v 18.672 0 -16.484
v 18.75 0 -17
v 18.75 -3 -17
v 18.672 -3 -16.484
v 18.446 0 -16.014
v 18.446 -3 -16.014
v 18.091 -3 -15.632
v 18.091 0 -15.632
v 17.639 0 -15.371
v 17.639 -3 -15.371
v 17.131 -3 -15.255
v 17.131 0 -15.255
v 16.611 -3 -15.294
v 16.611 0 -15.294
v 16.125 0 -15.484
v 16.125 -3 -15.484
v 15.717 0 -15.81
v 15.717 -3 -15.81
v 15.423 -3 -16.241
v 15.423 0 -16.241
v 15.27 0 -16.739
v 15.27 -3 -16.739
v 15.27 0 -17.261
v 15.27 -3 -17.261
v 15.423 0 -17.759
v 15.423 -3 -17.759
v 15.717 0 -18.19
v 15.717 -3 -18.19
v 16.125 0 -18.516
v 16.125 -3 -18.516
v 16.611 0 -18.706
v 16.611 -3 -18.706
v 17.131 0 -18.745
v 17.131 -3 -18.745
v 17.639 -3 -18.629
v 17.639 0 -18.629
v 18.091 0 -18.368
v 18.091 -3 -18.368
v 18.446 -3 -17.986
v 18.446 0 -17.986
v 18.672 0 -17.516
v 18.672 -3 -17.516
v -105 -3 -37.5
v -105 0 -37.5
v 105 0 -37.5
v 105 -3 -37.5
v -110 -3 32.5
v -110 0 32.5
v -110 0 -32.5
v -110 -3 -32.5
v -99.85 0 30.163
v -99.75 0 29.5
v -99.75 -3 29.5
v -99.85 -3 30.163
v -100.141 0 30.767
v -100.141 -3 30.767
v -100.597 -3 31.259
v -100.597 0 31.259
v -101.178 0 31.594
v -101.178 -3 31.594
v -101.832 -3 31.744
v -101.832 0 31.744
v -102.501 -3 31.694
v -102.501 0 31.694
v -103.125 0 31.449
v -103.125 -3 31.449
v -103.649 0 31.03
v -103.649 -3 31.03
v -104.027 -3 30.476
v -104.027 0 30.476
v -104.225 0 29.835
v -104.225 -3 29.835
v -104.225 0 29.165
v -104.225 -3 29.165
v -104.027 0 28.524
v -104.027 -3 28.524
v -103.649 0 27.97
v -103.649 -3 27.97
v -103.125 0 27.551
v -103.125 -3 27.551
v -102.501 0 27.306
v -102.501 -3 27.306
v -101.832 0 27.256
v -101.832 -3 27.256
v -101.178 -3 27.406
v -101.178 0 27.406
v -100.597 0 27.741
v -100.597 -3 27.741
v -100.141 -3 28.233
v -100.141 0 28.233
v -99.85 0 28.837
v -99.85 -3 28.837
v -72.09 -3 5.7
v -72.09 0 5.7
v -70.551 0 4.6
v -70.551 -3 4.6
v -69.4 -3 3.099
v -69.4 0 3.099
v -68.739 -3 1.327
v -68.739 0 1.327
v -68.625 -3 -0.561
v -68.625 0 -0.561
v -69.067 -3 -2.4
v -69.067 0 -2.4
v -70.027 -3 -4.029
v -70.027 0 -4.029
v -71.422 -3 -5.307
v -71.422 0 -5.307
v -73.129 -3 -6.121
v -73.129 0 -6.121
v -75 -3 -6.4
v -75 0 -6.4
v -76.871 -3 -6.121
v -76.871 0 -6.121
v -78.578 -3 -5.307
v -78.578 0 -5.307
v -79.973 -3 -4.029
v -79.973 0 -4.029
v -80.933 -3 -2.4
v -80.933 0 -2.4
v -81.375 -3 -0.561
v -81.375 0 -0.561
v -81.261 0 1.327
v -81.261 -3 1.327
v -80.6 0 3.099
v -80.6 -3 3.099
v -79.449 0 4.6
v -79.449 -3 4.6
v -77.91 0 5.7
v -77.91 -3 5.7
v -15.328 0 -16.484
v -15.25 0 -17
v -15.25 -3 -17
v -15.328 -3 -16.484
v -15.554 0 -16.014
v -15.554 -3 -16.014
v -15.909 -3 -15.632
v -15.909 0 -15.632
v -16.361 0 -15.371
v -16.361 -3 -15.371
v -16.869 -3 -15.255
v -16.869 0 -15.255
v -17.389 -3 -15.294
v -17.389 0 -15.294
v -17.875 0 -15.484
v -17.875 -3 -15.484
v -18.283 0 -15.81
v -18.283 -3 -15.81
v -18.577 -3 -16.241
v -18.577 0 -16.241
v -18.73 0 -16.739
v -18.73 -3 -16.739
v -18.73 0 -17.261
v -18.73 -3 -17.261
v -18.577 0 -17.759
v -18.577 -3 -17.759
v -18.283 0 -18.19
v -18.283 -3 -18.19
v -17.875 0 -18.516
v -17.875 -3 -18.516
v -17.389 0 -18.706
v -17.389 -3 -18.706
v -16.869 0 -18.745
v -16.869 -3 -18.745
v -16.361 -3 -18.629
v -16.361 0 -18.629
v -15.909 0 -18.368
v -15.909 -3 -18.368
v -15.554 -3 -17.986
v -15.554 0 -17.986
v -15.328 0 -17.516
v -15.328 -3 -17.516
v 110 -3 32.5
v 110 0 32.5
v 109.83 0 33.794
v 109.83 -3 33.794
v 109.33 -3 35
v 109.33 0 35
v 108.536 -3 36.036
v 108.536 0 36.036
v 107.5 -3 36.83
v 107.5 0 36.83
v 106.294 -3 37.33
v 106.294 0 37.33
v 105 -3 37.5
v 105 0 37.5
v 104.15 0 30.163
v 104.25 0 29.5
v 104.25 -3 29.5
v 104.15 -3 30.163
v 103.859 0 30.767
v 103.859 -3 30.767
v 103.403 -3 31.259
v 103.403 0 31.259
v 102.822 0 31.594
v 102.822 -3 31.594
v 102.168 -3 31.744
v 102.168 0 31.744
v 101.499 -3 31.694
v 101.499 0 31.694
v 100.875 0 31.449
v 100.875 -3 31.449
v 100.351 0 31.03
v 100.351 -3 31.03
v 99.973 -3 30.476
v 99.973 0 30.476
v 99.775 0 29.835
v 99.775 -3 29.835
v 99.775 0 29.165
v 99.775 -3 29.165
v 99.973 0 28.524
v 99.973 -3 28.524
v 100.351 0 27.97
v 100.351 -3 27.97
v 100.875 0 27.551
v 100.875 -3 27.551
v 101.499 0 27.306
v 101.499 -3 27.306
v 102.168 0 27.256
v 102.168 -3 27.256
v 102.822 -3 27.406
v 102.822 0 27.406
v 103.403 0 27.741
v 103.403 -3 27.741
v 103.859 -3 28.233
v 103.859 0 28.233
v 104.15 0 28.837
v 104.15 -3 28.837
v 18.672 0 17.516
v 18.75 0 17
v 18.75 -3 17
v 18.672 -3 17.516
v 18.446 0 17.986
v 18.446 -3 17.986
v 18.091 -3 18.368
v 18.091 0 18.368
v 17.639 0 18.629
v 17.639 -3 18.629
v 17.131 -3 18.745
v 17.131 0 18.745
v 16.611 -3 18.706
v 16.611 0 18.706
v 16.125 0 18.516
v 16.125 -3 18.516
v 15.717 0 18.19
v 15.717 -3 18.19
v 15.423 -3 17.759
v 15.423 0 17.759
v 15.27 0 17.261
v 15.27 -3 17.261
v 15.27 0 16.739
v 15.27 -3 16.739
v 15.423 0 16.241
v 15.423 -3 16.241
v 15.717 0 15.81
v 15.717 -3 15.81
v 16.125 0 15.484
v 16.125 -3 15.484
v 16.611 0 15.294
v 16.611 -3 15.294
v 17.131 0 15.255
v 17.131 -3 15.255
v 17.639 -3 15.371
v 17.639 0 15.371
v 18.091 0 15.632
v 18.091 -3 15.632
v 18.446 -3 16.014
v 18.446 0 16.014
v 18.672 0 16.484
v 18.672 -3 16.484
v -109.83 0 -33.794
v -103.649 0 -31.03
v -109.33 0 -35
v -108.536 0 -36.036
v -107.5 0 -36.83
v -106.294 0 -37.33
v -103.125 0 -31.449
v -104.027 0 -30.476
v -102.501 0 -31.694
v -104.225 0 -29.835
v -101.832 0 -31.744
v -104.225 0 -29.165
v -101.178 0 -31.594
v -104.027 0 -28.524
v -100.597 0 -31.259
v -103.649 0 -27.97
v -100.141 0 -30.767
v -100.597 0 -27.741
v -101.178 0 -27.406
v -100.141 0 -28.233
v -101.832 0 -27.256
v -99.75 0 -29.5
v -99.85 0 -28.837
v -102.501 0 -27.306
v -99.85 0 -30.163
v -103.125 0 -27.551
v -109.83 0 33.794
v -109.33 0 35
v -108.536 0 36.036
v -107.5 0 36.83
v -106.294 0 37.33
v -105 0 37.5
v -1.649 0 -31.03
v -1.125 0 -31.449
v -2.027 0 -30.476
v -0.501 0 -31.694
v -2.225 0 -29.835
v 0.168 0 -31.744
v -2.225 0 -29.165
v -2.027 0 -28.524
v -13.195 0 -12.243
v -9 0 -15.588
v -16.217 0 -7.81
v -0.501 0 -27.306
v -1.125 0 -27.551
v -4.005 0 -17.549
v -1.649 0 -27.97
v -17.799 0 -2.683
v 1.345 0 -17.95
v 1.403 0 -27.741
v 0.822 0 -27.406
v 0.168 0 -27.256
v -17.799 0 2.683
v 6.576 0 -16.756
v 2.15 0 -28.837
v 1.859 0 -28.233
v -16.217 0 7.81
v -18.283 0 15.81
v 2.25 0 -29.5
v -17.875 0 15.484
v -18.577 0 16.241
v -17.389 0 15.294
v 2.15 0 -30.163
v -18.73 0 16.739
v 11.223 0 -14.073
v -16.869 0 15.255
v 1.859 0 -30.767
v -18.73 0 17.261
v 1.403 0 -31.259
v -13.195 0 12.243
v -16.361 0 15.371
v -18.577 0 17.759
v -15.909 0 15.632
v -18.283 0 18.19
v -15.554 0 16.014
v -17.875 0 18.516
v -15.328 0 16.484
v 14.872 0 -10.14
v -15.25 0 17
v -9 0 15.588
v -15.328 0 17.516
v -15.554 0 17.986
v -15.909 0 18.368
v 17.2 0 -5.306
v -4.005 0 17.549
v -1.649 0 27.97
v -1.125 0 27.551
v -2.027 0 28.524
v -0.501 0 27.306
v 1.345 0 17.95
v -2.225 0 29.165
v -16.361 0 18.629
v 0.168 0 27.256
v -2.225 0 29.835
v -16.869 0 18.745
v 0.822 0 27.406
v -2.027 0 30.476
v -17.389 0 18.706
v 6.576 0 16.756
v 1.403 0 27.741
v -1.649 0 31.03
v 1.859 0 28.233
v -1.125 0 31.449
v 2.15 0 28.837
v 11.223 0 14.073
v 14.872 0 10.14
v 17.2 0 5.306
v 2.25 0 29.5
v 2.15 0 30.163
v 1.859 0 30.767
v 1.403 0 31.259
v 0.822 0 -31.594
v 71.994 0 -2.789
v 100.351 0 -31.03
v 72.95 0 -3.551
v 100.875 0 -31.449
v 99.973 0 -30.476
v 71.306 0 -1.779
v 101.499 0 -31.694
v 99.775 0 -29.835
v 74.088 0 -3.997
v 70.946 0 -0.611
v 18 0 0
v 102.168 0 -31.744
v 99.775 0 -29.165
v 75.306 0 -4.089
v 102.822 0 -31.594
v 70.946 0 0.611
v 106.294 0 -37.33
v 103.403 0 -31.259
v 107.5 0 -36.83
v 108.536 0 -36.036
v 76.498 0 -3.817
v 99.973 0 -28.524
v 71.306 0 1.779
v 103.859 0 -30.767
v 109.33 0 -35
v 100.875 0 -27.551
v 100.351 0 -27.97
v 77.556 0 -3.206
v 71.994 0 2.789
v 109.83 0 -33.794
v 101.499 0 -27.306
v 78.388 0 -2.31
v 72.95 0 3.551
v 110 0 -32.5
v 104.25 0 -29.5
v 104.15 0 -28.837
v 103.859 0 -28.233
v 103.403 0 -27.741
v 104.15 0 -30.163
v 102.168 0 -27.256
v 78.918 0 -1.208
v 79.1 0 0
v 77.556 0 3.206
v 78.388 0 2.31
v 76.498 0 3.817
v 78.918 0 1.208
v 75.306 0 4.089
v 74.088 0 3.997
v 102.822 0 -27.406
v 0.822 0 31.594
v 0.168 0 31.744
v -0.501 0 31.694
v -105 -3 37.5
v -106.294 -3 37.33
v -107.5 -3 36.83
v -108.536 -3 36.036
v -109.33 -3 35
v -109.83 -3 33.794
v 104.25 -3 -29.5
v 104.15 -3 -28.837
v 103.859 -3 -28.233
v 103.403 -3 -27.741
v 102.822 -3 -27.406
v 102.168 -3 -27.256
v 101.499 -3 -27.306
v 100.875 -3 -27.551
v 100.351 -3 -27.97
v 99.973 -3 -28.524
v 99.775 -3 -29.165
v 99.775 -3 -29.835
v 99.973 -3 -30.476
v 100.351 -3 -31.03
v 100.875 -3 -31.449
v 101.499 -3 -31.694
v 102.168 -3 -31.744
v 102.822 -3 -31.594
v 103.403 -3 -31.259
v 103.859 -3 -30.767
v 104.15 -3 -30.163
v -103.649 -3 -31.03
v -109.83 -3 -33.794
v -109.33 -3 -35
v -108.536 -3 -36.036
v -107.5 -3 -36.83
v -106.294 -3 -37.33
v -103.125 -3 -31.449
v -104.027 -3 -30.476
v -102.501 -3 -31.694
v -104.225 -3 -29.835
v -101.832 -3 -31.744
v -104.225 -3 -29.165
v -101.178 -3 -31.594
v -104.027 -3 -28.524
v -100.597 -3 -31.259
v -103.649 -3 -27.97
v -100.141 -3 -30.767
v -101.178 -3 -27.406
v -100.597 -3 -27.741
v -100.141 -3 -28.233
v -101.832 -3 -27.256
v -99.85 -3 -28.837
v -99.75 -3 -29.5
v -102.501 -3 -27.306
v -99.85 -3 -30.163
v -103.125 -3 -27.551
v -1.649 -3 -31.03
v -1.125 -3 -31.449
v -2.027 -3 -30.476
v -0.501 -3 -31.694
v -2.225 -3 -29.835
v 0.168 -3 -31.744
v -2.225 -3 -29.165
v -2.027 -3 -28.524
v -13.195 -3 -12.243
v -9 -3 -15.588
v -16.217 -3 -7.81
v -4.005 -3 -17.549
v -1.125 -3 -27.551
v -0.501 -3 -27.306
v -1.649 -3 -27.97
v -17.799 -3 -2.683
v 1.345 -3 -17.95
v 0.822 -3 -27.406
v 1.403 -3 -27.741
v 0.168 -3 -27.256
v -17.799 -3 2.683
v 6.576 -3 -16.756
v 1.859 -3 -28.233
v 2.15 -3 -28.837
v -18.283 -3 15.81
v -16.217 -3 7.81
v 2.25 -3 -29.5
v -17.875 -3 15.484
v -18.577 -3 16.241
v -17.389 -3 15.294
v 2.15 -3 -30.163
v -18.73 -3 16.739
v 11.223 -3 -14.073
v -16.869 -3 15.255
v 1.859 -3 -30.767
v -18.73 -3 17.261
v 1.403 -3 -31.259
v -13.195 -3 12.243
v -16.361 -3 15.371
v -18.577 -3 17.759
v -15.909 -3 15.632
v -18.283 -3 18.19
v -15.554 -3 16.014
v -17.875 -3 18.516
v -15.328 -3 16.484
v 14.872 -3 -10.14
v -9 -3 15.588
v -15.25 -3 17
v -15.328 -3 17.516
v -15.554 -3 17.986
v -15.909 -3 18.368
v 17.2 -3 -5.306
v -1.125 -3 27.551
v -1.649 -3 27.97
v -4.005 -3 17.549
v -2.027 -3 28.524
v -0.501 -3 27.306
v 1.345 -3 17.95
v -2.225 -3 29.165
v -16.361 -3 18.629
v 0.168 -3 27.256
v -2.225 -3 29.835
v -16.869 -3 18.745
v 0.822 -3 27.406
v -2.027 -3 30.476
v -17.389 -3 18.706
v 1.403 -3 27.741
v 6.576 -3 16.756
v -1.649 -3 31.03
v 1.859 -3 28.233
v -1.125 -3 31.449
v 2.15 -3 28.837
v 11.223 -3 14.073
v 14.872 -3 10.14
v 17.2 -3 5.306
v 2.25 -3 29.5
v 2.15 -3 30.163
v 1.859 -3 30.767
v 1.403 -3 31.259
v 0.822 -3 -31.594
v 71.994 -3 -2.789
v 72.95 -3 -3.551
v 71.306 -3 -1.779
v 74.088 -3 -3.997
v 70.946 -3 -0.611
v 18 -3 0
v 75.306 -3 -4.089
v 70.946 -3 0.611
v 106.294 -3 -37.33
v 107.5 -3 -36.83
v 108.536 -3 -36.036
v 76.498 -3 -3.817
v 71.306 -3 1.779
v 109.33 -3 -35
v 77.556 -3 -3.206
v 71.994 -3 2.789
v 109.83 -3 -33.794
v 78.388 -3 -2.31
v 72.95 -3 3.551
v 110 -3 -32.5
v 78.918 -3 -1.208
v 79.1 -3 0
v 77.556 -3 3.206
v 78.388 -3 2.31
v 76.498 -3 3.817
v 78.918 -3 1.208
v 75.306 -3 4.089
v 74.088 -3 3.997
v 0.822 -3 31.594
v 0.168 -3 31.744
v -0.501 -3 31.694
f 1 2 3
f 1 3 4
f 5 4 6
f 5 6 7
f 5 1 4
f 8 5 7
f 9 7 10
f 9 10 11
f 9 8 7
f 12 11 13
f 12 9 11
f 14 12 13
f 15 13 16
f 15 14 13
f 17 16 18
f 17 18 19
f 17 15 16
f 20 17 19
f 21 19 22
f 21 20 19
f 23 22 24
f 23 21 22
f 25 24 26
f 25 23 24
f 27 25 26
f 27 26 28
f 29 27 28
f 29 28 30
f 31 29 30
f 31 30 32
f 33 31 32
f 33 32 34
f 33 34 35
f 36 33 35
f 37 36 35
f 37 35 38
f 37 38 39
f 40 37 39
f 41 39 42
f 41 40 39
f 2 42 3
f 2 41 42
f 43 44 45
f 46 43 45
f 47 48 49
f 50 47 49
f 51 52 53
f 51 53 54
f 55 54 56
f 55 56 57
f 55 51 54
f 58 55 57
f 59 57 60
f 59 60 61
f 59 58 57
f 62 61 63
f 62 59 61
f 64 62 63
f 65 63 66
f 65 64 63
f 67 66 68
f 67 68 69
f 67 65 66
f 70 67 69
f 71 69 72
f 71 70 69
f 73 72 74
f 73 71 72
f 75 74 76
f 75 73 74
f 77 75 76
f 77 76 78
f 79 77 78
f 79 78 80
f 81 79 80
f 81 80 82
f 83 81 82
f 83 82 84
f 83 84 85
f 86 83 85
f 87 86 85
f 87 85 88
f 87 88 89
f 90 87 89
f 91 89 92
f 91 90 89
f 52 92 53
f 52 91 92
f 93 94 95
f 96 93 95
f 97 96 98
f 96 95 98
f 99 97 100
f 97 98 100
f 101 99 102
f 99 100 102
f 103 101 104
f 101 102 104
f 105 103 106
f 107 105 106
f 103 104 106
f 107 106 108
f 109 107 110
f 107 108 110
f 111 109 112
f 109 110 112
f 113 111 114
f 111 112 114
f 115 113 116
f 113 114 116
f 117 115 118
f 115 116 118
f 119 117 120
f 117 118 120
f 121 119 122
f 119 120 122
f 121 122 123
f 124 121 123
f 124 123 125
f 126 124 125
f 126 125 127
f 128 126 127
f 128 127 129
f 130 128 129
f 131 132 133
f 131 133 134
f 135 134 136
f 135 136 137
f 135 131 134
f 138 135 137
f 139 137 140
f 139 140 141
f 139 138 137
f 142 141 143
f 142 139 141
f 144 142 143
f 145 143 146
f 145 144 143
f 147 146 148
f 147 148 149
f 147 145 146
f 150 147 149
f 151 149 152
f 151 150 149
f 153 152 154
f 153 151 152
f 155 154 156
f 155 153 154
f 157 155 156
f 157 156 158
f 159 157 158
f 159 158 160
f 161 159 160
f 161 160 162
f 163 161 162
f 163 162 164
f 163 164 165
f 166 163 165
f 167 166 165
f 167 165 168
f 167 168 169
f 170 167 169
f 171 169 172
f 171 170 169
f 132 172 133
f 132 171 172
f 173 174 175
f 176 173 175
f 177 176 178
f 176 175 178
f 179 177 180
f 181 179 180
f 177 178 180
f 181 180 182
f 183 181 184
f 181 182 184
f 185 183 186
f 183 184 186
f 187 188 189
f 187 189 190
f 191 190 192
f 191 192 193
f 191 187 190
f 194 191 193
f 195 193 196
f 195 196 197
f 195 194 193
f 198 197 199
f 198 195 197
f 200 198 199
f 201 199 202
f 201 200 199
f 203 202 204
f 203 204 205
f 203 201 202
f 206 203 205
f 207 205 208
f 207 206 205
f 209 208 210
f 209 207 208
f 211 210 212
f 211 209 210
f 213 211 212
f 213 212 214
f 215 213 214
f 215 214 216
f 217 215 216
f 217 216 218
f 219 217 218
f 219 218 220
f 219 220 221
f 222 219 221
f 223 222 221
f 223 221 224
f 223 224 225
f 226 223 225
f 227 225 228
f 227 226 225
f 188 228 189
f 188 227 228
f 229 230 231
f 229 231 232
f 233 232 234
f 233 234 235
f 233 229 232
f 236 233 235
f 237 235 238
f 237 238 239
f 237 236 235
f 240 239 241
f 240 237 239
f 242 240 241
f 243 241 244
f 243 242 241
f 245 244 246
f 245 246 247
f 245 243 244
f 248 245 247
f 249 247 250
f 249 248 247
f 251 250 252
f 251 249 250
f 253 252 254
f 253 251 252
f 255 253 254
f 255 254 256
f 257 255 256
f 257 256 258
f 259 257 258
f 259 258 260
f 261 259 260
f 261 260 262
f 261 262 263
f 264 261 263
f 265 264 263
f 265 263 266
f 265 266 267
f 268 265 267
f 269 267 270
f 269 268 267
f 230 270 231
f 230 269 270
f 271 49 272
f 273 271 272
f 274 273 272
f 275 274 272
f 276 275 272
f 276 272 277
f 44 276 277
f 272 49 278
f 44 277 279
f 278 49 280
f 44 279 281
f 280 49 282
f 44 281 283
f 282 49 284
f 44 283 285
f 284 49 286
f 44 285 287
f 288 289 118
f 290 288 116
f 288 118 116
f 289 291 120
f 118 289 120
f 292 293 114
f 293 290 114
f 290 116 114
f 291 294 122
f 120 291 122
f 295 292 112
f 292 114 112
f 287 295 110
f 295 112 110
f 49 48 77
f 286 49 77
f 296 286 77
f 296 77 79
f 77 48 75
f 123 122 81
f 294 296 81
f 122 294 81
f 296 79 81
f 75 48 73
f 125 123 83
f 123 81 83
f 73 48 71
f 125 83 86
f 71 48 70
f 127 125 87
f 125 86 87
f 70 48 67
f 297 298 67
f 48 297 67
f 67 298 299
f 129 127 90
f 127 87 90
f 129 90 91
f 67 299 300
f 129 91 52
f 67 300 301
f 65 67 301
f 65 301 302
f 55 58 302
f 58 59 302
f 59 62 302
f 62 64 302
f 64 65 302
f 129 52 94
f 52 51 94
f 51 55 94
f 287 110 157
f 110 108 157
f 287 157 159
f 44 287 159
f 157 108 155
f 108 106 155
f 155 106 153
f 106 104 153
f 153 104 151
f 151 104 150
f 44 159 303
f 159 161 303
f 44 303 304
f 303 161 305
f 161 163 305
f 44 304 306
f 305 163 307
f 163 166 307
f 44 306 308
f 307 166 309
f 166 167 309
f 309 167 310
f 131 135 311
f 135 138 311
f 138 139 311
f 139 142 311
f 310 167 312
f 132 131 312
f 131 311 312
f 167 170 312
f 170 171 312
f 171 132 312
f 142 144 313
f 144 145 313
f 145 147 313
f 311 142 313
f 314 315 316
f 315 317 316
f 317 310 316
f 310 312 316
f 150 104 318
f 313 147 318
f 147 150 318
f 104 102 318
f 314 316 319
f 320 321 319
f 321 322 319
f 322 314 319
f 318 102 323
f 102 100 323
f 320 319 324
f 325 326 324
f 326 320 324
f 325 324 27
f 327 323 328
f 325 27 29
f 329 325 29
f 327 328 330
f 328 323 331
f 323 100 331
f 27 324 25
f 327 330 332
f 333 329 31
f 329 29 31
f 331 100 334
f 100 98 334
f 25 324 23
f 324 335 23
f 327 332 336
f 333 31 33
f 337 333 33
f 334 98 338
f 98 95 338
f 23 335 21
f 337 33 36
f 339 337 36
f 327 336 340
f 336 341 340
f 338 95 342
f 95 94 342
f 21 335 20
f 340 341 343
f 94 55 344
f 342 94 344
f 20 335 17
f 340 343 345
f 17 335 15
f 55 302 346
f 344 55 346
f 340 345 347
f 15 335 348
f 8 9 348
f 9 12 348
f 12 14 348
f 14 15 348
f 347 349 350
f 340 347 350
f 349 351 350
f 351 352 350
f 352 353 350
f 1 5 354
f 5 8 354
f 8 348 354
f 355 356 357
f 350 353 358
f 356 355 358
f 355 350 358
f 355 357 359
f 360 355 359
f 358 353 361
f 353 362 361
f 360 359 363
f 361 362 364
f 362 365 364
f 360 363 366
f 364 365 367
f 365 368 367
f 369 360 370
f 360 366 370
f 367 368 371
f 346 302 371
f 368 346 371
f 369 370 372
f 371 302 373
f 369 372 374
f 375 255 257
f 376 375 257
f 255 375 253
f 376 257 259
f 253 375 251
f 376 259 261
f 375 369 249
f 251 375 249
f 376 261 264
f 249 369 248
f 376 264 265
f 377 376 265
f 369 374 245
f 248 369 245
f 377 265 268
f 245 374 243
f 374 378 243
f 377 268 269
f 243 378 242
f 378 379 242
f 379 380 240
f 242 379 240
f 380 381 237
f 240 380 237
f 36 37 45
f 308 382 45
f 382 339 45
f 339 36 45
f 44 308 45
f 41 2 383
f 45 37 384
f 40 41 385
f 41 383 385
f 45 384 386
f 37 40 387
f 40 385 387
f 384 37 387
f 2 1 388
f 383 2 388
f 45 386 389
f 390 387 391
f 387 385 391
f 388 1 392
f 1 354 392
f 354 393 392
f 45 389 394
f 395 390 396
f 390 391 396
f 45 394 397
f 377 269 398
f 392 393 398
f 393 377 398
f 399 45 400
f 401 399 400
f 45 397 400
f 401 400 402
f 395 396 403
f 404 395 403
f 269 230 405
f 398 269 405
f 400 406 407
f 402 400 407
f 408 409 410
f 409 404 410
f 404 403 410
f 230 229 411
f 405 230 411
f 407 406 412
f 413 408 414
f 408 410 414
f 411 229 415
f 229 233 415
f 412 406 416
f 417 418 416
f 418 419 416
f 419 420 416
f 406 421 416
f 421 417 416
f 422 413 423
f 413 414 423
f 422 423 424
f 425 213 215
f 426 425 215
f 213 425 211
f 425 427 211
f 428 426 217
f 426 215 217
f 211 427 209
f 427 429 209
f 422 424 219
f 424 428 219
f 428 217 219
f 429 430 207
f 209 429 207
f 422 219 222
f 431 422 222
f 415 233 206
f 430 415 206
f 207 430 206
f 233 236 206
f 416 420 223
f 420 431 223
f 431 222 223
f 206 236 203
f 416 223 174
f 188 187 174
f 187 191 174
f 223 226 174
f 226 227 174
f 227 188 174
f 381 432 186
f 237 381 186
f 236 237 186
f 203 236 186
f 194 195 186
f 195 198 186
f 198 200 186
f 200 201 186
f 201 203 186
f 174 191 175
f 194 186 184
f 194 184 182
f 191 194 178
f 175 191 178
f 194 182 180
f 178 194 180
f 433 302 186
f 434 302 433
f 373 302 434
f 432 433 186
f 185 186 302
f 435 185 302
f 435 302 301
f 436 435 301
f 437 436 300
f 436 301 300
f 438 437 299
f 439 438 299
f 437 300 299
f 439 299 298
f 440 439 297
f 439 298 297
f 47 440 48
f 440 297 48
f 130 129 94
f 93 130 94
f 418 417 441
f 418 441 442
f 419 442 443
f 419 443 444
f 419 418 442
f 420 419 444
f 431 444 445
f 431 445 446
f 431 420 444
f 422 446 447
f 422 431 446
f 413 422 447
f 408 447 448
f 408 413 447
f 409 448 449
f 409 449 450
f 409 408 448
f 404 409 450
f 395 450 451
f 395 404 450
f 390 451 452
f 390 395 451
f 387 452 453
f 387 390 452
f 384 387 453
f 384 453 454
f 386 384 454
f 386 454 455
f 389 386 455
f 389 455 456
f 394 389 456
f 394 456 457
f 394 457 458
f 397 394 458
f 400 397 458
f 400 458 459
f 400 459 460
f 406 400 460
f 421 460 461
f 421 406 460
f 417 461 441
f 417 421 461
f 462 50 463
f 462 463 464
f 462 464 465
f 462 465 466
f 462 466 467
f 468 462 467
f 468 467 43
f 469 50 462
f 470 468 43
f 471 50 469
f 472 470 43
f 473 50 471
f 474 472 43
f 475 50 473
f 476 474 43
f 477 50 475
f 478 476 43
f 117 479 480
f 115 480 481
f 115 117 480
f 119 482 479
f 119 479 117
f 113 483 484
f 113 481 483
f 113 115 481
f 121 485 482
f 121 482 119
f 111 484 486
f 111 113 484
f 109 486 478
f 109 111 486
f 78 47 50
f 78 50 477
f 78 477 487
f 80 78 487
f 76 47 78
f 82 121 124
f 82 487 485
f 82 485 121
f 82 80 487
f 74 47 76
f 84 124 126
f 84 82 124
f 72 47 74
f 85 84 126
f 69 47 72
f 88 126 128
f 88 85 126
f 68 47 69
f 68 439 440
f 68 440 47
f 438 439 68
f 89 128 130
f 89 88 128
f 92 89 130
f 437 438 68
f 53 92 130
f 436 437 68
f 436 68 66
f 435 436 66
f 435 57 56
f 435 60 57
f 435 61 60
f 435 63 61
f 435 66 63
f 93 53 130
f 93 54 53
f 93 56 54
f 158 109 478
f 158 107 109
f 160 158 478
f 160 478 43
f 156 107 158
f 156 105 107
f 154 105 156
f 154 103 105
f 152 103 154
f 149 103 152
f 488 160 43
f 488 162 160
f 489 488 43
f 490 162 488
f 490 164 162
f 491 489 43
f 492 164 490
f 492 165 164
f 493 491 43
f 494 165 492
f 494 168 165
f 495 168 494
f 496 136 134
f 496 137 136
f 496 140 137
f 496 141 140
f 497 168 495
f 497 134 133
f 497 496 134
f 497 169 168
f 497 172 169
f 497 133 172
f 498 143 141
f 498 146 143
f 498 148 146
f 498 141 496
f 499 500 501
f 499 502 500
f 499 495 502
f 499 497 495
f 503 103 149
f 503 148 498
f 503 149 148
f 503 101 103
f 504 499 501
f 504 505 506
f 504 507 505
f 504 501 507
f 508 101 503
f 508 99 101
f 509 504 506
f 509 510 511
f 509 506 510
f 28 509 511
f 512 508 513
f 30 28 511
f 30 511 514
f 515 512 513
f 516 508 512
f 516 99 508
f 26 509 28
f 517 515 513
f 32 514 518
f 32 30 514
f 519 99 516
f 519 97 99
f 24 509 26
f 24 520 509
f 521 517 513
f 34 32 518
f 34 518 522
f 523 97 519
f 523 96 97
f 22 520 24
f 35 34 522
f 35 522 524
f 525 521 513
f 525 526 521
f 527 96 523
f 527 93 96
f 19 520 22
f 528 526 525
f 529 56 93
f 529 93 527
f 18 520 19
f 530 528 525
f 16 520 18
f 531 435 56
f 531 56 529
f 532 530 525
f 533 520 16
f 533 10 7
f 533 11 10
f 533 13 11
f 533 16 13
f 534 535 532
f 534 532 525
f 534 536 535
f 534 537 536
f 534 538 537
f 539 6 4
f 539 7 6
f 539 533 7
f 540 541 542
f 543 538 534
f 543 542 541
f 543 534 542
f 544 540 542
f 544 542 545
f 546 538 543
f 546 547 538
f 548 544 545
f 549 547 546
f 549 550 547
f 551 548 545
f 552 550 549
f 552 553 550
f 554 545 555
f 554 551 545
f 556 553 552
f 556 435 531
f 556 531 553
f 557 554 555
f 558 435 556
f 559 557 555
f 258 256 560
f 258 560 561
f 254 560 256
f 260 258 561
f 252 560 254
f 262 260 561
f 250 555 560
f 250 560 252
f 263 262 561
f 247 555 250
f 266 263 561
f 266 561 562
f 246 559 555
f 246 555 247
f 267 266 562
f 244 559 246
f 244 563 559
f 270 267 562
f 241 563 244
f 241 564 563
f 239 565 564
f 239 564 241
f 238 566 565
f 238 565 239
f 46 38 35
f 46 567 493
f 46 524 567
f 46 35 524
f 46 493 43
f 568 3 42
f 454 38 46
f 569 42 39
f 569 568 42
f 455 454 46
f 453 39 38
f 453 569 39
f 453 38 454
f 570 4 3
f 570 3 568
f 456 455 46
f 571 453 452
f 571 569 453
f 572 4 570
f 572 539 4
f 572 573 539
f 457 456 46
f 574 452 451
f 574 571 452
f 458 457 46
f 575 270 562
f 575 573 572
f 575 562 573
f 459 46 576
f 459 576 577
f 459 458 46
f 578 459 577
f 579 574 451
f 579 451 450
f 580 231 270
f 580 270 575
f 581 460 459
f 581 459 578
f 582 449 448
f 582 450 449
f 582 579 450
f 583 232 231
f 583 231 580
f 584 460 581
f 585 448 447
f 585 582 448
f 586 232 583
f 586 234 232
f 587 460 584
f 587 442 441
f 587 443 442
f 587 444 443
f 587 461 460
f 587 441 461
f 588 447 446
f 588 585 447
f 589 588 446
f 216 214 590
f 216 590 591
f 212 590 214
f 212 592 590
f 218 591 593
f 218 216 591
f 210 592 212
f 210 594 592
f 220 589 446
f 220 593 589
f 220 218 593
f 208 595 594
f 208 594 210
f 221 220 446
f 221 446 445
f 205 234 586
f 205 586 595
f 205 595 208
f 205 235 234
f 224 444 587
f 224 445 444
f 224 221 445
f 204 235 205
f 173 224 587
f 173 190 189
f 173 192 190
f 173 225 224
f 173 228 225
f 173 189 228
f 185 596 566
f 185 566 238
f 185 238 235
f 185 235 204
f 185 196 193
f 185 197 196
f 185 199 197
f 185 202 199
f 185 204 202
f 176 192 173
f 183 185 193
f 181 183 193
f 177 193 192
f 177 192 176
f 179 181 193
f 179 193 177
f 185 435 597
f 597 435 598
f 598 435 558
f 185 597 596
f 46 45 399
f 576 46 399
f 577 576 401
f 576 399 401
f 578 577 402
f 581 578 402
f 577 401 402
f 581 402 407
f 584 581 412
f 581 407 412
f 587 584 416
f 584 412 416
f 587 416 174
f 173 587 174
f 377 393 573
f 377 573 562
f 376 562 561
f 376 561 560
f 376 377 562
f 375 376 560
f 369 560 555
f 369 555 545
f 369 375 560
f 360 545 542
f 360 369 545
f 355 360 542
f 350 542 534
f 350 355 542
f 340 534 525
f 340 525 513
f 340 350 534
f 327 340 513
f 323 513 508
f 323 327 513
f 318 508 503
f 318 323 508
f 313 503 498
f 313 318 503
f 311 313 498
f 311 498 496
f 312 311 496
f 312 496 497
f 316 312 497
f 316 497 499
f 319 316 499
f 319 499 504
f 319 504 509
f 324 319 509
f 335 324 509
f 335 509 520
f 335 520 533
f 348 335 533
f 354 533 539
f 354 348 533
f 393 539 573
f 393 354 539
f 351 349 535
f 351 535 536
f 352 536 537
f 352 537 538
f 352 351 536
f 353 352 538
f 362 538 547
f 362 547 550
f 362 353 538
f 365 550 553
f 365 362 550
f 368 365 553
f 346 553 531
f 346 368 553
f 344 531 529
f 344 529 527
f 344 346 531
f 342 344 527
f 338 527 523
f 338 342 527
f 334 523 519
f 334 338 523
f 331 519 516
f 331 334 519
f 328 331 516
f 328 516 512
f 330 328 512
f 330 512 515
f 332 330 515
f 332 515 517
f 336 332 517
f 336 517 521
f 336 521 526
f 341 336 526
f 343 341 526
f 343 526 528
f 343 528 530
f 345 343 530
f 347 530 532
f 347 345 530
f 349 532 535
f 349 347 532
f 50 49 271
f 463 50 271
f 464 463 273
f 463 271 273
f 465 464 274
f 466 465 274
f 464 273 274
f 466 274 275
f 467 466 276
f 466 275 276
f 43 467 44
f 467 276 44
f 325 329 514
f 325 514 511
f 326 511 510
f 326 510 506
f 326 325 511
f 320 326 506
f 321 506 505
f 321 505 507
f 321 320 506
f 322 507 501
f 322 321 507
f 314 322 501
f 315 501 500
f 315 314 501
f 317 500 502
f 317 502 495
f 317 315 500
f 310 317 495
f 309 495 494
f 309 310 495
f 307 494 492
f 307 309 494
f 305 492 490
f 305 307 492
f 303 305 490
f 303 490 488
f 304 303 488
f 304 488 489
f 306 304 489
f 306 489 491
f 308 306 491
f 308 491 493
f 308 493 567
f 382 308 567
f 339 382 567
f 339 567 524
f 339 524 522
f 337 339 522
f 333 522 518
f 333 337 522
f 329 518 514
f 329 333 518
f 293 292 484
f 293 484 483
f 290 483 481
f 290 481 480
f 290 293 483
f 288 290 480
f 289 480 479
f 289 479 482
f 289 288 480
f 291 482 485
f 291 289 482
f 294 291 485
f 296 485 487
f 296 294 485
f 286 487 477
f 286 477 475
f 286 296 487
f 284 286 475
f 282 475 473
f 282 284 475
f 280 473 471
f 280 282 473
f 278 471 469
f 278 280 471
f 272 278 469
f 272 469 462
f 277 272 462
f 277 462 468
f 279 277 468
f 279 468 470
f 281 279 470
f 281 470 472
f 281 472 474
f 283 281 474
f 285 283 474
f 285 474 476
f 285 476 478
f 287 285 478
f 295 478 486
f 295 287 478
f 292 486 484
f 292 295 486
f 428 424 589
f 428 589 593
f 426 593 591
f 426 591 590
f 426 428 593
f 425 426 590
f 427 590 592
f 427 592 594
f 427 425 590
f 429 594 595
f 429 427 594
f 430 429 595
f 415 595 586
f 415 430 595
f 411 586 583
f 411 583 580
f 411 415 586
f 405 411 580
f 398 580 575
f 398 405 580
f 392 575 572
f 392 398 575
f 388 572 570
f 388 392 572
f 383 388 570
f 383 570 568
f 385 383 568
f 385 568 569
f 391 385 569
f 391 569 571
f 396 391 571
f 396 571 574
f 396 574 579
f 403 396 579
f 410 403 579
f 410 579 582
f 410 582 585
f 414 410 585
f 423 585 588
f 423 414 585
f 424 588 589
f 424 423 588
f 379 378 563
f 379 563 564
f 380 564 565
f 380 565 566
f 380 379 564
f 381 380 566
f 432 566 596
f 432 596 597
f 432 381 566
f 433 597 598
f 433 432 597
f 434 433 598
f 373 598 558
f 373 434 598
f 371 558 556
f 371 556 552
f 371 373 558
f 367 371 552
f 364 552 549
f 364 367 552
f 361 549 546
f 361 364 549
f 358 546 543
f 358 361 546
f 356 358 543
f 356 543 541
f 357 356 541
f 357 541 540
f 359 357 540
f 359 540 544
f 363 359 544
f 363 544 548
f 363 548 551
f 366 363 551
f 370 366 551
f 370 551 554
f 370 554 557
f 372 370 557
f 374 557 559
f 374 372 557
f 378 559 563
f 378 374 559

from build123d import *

# Parameters (mm, degrees)
F0_R     = 2.25
F0_R_2   = 1.75
F0_R_3   = 18
F0_R_4   = 4.1
F1_DEPTH = 3


with BuildPart() as f1:
    # F0 (on Front) → F1 (new body)
    with BuildSketch(Plane.XZ):
        with BuildLine():
            ThreePointArc((110, 32.5), (108.535534, 36.035534), (105, 37.5))
            Line((105, 37.5), (-105, 37.5))
            ThreePointArc((-105, 37.5), (-108.535534, 36.035534), (-110, 32.5))
            Line((-110, 32.5), (-110, -32.5))
            ThreePointArc((-110, -32.5), (-108.535534, -36.035534), (-105, -37.5))
            Line((-105, -37.5), (105, -37.5))
            ThreePointArc((105, -37.5), (108.535534, -36.035534), (110, -32.5))
            Line((110, -32.5), (110, 32.5))
        make_face()
        with Locations((-102, -29.5)):
            Circle(F0_R, mode=Mode.SUBTRACT)
        with BuildLine():
            ThreePointArc((-72.089674, 5.7), (-75, -6.4), (-77.910326, 5.7))
            Line((-77.910326, 5.7), (-72.089674, 5.7))
        make_face(mode=Mode.SUBTRACT)
        with Locations((-17, -17)):
            Circle(F0_R_2, mode=Mode.SUBTRACT)
        with Locations((0, -29.5)):
            Circle(F0_R, mode=Mode.SUBTRACT)
        with Locations((102, -29.5)):
            Circle(F0_R, mode=Mode.SUBTRACT)
        with Locations((17, -17)):
            Circle(F0_R_2, mode=Mode.SUBTRACT)
        with Locations((-17, 17)):
            Circle(F0_R_2, mode=Mode.SUBTRACT)
        with Locations((-102, 29.5)):
            Circle(F0_R, mode=Mode.SUBTRACT)
        Circle(F0_R_3, mode=Mode.SUBTRACT)
        with Locations((17, 17)):
            Circle(F0_R_2, mode=Mode.SUBTRACT)
        with Locations((75, 0)):
            Circle(F0_R_4, mode=Mode.SUBTRACT)
        with Locations((0, 29.5)):
            Circle(F0_R, mode=Mode.SUBTRACT)
        with Locations((102, 29.5)):
            Circle(F0_R, mode=Mode.SUBTRACT)
    extrude(amount=F1_DEPTH)


solid = f1.part
